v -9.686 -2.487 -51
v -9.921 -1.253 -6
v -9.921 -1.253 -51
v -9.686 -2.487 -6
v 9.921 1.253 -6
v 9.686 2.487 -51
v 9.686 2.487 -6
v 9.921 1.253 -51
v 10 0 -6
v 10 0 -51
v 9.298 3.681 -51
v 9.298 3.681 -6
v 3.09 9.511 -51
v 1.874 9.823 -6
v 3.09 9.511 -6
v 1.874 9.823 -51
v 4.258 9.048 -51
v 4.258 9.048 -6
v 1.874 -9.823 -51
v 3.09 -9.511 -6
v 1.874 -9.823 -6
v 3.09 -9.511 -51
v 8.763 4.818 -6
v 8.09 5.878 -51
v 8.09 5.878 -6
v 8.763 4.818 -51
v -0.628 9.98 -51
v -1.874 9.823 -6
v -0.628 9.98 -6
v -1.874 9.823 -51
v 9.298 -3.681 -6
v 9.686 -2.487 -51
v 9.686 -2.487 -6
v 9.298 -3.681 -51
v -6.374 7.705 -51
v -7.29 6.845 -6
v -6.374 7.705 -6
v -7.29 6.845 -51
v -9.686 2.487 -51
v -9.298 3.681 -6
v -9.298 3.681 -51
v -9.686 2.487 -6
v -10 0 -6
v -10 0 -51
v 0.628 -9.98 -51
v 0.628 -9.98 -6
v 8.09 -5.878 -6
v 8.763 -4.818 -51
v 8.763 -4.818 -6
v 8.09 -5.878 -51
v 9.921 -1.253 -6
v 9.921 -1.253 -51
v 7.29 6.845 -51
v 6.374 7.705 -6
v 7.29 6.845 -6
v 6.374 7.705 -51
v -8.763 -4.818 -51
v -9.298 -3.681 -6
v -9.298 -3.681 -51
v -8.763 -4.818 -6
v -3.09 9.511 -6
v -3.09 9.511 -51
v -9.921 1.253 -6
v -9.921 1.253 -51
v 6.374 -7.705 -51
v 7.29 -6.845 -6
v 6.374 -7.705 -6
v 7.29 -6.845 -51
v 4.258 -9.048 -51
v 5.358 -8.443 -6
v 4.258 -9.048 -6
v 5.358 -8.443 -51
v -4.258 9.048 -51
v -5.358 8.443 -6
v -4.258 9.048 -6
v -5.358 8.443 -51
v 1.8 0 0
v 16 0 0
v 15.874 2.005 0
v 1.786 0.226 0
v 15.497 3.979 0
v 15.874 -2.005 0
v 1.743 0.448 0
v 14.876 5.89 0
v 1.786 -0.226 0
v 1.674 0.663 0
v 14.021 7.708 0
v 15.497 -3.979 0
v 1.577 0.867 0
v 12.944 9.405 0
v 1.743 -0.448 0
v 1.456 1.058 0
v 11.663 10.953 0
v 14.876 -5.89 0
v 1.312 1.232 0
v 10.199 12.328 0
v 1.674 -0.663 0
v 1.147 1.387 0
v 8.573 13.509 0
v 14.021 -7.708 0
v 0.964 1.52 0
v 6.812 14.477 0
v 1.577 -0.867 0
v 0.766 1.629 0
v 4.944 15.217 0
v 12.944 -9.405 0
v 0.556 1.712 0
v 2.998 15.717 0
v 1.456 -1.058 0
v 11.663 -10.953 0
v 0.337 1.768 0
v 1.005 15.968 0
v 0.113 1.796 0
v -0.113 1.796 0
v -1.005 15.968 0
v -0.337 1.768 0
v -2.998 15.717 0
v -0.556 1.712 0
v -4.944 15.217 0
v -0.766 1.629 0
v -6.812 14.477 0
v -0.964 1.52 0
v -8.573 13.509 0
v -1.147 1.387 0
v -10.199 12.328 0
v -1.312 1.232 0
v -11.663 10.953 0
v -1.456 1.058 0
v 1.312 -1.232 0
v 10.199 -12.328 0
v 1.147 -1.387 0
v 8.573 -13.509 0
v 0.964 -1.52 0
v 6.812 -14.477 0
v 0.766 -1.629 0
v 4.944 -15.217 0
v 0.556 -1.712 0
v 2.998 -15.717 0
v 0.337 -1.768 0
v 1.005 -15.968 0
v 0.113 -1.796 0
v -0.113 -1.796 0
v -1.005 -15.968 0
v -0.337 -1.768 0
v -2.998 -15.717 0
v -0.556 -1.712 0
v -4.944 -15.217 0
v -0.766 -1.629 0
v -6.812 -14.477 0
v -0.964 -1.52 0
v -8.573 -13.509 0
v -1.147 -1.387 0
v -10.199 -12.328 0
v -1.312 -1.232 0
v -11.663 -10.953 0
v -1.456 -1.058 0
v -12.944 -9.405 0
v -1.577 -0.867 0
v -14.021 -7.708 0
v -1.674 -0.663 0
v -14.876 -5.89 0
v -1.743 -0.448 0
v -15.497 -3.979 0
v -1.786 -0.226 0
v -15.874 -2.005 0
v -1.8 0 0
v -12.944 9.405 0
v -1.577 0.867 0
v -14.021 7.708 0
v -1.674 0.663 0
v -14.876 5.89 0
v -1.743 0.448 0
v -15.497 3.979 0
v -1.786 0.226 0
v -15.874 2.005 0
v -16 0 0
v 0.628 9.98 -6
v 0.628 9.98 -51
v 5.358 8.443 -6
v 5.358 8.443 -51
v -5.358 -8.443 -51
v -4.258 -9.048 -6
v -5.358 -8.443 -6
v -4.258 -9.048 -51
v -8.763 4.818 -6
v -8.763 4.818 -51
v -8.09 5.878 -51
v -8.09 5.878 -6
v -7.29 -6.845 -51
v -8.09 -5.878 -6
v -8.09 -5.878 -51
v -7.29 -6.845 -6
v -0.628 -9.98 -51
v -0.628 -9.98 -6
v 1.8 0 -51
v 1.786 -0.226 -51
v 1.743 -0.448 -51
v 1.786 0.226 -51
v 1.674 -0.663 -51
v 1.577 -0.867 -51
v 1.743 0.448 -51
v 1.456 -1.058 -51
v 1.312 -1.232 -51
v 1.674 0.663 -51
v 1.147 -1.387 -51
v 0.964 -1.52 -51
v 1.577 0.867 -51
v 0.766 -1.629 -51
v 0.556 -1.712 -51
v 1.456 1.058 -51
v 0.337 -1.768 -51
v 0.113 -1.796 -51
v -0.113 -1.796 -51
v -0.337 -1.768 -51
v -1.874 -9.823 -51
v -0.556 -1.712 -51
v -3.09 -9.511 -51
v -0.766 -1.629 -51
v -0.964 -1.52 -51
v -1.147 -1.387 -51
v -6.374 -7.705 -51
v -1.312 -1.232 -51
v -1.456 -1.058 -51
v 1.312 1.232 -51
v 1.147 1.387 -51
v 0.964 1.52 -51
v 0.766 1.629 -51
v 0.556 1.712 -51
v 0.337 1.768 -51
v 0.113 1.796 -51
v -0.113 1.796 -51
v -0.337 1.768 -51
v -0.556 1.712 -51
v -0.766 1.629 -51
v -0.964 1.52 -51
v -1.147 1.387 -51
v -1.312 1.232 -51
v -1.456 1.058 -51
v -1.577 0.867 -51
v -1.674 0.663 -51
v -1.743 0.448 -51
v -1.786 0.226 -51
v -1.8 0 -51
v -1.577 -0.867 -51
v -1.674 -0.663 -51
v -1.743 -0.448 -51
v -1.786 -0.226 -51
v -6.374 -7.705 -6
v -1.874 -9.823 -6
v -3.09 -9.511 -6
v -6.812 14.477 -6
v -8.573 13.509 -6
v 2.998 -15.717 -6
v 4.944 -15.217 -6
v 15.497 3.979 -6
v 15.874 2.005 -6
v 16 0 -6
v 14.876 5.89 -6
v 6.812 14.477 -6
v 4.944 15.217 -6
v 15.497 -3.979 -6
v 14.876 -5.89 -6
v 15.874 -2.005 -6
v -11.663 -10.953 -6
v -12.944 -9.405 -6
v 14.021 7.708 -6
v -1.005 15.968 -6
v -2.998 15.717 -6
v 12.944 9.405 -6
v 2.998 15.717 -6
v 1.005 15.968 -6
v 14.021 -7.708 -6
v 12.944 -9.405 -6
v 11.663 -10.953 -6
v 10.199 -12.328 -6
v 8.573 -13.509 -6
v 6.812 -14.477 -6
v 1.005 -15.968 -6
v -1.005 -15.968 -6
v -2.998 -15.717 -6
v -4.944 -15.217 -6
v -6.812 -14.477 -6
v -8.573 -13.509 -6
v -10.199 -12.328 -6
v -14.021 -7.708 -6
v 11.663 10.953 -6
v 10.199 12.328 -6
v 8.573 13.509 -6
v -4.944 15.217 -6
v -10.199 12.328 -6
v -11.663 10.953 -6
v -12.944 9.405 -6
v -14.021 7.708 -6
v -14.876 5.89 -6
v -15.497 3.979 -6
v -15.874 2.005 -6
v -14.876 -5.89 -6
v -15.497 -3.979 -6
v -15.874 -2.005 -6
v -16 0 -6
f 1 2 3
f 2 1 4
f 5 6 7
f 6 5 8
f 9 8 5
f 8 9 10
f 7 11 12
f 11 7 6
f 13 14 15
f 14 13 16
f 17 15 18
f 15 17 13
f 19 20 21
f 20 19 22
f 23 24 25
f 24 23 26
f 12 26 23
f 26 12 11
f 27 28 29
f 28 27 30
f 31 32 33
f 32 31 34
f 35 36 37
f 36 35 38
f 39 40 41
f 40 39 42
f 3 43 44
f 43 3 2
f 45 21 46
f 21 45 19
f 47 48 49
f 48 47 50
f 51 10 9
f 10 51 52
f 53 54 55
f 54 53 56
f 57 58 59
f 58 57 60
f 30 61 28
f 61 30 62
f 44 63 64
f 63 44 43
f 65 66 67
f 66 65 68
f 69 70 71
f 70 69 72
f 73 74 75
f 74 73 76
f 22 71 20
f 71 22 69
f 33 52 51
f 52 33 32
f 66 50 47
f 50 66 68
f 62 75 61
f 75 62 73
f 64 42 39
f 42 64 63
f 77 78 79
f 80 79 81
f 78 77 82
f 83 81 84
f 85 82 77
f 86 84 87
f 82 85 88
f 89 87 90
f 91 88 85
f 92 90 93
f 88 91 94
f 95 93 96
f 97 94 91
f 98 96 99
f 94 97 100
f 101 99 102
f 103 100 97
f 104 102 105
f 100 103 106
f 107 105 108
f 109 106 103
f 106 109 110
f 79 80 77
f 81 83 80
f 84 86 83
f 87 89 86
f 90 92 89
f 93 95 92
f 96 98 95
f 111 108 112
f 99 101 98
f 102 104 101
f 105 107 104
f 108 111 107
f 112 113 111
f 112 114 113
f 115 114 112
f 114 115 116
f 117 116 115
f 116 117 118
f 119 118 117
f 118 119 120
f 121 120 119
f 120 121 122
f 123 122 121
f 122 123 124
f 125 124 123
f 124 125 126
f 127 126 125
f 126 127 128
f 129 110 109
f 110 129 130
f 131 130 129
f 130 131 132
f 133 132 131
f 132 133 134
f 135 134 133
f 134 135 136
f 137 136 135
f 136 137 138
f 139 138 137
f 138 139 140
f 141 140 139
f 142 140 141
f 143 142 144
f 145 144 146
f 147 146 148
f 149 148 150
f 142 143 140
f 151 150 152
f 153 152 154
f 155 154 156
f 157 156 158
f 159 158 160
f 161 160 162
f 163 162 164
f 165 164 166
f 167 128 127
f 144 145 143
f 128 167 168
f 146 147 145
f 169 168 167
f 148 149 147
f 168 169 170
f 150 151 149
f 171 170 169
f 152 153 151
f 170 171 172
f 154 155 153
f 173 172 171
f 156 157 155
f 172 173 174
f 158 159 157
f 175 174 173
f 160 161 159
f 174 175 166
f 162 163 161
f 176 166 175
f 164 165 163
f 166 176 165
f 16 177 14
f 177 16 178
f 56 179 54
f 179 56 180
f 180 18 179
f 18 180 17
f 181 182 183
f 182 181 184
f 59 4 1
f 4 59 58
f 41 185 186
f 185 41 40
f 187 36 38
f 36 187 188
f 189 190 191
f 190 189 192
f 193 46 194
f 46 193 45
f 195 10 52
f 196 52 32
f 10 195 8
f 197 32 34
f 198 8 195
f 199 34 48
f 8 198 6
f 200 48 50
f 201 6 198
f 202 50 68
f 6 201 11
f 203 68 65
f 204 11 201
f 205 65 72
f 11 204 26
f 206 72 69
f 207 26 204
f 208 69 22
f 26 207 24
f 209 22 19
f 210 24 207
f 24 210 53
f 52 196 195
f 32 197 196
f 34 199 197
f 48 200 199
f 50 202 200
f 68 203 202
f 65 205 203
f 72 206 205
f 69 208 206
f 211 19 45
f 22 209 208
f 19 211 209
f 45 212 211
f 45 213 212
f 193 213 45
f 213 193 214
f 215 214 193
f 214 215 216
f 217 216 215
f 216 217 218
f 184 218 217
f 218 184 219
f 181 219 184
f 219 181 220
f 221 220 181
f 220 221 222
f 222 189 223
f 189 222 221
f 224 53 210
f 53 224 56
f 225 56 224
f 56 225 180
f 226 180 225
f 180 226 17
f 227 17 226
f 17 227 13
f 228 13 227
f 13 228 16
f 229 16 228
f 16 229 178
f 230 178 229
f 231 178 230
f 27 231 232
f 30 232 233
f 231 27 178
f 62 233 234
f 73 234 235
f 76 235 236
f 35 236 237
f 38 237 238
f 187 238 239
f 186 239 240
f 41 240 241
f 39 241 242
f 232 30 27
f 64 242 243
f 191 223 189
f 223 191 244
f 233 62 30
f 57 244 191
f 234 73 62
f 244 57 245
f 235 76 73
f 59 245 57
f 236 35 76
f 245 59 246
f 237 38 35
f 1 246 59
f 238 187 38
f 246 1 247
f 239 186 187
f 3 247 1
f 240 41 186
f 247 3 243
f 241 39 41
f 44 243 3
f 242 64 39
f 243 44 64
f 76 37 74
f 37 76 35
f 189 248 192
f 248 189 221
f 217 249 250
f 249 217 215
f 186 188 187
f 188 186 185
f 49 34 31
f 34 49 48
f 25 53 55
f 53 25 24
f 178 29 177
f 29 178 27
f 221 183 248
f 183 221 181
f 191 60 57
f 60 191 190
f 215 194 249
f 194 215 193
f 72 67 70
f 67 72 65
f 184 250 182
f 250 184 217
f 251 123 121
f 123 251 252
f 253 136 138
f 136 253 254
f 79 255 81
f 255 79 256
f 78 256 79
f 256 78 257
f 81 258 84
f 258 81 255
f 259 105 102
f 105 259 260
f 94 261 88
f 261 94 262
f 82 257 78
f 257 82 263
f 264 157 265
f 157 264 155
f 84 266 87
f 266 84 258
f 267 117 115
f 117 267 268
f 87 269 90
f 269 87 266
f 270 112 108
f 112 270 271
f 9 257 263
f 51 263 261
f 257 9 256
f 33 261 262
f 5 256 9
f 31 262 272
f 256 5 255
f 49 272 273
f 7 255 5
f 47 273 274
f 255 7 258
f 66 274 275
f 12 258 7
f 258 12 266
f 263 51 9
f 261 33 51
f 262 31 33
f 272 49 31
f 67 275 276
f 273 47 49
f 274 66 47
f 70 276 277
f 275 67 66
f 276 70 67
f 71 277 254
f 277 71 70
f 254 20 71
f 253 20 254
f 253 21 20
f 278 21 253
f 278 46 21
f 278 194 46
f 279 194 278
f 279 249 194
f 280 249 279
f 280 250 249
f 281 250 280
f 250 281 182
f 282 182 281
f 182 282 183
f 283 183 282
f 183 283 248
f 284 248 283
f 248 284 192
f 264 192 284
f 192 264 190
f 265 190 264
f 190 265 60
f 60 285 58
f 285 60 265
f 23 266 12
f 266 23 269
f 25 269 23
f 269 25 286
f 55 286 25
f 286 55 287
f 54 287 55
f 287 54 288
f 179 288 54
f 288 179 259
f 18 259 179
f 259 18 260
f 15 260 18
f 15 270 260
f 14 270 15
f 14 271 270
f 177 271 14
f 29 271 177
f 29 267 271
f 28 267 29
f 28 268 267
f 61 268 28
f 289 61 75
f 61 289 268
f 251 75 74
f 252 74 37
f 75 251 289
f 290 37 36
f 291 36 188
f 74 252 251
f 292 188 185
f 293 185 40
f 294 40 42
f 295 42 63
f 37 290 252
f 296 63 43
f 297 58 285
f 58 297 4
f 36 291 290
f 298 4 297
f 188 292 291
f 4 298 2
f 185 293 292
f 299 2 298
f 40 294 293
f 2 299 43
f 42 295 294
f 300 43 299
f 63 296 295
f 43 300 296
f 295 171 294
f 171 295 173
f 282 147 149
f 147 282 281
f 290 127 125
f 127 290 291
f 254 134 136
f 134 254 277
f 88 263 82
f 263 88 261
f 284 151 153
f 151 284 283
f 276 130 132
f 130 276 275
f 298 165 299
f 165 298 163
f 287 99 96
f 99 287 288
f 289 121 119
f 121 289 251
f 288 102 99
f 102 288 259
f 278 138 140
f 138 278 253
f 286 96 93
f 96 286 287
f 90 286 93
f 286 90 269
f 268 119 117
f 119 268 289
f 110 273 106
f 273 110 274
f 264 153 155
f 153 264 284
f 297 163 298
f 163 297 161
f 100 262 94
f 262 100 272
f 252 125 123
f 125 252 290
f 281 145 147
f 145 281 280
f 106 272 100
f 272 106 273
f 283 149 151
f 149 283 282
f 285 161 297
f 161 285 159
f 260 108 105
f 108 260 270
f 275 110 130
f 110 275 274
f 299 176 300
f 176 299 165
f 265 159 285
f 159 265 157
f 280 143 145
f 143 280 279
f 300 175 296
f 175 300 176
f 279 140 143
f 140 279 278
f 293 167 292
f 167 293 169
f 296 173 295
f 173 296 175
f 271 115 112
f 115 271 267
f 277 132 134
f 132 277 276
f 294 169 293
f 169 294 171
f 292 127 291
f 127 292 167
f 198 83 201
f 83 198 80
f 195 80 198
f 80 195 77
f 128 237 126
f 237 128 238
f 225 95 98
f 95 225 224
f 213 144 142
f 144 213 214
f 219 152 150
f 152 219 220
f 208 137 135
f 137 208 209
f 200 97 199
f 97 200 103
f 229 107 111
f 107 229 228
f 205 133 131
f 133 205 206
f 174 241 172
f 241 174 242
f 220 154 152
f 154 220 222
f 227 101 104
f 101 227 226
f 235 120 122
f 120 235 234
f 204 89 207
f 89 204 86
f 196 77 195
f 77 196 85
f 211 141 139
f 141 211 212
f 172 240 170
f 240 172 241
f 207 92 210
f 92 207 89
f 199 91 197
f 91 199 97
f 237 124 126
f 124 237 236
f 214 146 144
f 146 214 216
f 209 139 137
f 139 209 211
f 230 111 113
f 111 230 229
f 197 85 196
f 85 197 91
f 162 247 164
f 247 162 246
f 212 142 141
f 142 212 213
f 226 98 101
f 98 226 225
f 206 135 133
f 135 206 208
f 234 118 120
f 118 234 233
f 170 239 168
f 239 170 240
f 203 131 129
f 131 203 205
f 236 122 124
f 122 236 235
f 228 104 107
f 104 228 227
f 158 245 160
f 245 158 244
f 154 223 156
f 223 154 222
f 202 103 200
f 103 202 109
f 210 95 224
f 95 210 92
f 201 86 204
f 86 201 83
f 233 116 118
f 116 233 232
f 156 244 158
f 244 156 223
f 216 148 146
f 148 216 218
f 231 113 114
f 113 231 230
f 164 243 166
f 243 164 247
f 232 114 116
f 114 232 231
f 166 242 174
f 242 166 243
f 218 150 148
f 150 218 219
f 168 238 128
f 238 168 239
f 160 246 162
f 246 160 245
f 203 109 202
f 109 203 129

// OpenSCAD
$fn = 50;


difference() {
	union() {
		translate(v = [0, 0, -51.0000000000]) {
			cylinder(h = 51, r = 10.0000000000);
		}
		translate(v = [0, 0, -6.0000000000]) {
			cylinder(h = 6, r = 16.0000000000);
		}
	}
	union() {
		#translate(v = [0, 0, -51]) {
			cylinder(h = 51, r = 1.8000000000);
		}
	}
}
